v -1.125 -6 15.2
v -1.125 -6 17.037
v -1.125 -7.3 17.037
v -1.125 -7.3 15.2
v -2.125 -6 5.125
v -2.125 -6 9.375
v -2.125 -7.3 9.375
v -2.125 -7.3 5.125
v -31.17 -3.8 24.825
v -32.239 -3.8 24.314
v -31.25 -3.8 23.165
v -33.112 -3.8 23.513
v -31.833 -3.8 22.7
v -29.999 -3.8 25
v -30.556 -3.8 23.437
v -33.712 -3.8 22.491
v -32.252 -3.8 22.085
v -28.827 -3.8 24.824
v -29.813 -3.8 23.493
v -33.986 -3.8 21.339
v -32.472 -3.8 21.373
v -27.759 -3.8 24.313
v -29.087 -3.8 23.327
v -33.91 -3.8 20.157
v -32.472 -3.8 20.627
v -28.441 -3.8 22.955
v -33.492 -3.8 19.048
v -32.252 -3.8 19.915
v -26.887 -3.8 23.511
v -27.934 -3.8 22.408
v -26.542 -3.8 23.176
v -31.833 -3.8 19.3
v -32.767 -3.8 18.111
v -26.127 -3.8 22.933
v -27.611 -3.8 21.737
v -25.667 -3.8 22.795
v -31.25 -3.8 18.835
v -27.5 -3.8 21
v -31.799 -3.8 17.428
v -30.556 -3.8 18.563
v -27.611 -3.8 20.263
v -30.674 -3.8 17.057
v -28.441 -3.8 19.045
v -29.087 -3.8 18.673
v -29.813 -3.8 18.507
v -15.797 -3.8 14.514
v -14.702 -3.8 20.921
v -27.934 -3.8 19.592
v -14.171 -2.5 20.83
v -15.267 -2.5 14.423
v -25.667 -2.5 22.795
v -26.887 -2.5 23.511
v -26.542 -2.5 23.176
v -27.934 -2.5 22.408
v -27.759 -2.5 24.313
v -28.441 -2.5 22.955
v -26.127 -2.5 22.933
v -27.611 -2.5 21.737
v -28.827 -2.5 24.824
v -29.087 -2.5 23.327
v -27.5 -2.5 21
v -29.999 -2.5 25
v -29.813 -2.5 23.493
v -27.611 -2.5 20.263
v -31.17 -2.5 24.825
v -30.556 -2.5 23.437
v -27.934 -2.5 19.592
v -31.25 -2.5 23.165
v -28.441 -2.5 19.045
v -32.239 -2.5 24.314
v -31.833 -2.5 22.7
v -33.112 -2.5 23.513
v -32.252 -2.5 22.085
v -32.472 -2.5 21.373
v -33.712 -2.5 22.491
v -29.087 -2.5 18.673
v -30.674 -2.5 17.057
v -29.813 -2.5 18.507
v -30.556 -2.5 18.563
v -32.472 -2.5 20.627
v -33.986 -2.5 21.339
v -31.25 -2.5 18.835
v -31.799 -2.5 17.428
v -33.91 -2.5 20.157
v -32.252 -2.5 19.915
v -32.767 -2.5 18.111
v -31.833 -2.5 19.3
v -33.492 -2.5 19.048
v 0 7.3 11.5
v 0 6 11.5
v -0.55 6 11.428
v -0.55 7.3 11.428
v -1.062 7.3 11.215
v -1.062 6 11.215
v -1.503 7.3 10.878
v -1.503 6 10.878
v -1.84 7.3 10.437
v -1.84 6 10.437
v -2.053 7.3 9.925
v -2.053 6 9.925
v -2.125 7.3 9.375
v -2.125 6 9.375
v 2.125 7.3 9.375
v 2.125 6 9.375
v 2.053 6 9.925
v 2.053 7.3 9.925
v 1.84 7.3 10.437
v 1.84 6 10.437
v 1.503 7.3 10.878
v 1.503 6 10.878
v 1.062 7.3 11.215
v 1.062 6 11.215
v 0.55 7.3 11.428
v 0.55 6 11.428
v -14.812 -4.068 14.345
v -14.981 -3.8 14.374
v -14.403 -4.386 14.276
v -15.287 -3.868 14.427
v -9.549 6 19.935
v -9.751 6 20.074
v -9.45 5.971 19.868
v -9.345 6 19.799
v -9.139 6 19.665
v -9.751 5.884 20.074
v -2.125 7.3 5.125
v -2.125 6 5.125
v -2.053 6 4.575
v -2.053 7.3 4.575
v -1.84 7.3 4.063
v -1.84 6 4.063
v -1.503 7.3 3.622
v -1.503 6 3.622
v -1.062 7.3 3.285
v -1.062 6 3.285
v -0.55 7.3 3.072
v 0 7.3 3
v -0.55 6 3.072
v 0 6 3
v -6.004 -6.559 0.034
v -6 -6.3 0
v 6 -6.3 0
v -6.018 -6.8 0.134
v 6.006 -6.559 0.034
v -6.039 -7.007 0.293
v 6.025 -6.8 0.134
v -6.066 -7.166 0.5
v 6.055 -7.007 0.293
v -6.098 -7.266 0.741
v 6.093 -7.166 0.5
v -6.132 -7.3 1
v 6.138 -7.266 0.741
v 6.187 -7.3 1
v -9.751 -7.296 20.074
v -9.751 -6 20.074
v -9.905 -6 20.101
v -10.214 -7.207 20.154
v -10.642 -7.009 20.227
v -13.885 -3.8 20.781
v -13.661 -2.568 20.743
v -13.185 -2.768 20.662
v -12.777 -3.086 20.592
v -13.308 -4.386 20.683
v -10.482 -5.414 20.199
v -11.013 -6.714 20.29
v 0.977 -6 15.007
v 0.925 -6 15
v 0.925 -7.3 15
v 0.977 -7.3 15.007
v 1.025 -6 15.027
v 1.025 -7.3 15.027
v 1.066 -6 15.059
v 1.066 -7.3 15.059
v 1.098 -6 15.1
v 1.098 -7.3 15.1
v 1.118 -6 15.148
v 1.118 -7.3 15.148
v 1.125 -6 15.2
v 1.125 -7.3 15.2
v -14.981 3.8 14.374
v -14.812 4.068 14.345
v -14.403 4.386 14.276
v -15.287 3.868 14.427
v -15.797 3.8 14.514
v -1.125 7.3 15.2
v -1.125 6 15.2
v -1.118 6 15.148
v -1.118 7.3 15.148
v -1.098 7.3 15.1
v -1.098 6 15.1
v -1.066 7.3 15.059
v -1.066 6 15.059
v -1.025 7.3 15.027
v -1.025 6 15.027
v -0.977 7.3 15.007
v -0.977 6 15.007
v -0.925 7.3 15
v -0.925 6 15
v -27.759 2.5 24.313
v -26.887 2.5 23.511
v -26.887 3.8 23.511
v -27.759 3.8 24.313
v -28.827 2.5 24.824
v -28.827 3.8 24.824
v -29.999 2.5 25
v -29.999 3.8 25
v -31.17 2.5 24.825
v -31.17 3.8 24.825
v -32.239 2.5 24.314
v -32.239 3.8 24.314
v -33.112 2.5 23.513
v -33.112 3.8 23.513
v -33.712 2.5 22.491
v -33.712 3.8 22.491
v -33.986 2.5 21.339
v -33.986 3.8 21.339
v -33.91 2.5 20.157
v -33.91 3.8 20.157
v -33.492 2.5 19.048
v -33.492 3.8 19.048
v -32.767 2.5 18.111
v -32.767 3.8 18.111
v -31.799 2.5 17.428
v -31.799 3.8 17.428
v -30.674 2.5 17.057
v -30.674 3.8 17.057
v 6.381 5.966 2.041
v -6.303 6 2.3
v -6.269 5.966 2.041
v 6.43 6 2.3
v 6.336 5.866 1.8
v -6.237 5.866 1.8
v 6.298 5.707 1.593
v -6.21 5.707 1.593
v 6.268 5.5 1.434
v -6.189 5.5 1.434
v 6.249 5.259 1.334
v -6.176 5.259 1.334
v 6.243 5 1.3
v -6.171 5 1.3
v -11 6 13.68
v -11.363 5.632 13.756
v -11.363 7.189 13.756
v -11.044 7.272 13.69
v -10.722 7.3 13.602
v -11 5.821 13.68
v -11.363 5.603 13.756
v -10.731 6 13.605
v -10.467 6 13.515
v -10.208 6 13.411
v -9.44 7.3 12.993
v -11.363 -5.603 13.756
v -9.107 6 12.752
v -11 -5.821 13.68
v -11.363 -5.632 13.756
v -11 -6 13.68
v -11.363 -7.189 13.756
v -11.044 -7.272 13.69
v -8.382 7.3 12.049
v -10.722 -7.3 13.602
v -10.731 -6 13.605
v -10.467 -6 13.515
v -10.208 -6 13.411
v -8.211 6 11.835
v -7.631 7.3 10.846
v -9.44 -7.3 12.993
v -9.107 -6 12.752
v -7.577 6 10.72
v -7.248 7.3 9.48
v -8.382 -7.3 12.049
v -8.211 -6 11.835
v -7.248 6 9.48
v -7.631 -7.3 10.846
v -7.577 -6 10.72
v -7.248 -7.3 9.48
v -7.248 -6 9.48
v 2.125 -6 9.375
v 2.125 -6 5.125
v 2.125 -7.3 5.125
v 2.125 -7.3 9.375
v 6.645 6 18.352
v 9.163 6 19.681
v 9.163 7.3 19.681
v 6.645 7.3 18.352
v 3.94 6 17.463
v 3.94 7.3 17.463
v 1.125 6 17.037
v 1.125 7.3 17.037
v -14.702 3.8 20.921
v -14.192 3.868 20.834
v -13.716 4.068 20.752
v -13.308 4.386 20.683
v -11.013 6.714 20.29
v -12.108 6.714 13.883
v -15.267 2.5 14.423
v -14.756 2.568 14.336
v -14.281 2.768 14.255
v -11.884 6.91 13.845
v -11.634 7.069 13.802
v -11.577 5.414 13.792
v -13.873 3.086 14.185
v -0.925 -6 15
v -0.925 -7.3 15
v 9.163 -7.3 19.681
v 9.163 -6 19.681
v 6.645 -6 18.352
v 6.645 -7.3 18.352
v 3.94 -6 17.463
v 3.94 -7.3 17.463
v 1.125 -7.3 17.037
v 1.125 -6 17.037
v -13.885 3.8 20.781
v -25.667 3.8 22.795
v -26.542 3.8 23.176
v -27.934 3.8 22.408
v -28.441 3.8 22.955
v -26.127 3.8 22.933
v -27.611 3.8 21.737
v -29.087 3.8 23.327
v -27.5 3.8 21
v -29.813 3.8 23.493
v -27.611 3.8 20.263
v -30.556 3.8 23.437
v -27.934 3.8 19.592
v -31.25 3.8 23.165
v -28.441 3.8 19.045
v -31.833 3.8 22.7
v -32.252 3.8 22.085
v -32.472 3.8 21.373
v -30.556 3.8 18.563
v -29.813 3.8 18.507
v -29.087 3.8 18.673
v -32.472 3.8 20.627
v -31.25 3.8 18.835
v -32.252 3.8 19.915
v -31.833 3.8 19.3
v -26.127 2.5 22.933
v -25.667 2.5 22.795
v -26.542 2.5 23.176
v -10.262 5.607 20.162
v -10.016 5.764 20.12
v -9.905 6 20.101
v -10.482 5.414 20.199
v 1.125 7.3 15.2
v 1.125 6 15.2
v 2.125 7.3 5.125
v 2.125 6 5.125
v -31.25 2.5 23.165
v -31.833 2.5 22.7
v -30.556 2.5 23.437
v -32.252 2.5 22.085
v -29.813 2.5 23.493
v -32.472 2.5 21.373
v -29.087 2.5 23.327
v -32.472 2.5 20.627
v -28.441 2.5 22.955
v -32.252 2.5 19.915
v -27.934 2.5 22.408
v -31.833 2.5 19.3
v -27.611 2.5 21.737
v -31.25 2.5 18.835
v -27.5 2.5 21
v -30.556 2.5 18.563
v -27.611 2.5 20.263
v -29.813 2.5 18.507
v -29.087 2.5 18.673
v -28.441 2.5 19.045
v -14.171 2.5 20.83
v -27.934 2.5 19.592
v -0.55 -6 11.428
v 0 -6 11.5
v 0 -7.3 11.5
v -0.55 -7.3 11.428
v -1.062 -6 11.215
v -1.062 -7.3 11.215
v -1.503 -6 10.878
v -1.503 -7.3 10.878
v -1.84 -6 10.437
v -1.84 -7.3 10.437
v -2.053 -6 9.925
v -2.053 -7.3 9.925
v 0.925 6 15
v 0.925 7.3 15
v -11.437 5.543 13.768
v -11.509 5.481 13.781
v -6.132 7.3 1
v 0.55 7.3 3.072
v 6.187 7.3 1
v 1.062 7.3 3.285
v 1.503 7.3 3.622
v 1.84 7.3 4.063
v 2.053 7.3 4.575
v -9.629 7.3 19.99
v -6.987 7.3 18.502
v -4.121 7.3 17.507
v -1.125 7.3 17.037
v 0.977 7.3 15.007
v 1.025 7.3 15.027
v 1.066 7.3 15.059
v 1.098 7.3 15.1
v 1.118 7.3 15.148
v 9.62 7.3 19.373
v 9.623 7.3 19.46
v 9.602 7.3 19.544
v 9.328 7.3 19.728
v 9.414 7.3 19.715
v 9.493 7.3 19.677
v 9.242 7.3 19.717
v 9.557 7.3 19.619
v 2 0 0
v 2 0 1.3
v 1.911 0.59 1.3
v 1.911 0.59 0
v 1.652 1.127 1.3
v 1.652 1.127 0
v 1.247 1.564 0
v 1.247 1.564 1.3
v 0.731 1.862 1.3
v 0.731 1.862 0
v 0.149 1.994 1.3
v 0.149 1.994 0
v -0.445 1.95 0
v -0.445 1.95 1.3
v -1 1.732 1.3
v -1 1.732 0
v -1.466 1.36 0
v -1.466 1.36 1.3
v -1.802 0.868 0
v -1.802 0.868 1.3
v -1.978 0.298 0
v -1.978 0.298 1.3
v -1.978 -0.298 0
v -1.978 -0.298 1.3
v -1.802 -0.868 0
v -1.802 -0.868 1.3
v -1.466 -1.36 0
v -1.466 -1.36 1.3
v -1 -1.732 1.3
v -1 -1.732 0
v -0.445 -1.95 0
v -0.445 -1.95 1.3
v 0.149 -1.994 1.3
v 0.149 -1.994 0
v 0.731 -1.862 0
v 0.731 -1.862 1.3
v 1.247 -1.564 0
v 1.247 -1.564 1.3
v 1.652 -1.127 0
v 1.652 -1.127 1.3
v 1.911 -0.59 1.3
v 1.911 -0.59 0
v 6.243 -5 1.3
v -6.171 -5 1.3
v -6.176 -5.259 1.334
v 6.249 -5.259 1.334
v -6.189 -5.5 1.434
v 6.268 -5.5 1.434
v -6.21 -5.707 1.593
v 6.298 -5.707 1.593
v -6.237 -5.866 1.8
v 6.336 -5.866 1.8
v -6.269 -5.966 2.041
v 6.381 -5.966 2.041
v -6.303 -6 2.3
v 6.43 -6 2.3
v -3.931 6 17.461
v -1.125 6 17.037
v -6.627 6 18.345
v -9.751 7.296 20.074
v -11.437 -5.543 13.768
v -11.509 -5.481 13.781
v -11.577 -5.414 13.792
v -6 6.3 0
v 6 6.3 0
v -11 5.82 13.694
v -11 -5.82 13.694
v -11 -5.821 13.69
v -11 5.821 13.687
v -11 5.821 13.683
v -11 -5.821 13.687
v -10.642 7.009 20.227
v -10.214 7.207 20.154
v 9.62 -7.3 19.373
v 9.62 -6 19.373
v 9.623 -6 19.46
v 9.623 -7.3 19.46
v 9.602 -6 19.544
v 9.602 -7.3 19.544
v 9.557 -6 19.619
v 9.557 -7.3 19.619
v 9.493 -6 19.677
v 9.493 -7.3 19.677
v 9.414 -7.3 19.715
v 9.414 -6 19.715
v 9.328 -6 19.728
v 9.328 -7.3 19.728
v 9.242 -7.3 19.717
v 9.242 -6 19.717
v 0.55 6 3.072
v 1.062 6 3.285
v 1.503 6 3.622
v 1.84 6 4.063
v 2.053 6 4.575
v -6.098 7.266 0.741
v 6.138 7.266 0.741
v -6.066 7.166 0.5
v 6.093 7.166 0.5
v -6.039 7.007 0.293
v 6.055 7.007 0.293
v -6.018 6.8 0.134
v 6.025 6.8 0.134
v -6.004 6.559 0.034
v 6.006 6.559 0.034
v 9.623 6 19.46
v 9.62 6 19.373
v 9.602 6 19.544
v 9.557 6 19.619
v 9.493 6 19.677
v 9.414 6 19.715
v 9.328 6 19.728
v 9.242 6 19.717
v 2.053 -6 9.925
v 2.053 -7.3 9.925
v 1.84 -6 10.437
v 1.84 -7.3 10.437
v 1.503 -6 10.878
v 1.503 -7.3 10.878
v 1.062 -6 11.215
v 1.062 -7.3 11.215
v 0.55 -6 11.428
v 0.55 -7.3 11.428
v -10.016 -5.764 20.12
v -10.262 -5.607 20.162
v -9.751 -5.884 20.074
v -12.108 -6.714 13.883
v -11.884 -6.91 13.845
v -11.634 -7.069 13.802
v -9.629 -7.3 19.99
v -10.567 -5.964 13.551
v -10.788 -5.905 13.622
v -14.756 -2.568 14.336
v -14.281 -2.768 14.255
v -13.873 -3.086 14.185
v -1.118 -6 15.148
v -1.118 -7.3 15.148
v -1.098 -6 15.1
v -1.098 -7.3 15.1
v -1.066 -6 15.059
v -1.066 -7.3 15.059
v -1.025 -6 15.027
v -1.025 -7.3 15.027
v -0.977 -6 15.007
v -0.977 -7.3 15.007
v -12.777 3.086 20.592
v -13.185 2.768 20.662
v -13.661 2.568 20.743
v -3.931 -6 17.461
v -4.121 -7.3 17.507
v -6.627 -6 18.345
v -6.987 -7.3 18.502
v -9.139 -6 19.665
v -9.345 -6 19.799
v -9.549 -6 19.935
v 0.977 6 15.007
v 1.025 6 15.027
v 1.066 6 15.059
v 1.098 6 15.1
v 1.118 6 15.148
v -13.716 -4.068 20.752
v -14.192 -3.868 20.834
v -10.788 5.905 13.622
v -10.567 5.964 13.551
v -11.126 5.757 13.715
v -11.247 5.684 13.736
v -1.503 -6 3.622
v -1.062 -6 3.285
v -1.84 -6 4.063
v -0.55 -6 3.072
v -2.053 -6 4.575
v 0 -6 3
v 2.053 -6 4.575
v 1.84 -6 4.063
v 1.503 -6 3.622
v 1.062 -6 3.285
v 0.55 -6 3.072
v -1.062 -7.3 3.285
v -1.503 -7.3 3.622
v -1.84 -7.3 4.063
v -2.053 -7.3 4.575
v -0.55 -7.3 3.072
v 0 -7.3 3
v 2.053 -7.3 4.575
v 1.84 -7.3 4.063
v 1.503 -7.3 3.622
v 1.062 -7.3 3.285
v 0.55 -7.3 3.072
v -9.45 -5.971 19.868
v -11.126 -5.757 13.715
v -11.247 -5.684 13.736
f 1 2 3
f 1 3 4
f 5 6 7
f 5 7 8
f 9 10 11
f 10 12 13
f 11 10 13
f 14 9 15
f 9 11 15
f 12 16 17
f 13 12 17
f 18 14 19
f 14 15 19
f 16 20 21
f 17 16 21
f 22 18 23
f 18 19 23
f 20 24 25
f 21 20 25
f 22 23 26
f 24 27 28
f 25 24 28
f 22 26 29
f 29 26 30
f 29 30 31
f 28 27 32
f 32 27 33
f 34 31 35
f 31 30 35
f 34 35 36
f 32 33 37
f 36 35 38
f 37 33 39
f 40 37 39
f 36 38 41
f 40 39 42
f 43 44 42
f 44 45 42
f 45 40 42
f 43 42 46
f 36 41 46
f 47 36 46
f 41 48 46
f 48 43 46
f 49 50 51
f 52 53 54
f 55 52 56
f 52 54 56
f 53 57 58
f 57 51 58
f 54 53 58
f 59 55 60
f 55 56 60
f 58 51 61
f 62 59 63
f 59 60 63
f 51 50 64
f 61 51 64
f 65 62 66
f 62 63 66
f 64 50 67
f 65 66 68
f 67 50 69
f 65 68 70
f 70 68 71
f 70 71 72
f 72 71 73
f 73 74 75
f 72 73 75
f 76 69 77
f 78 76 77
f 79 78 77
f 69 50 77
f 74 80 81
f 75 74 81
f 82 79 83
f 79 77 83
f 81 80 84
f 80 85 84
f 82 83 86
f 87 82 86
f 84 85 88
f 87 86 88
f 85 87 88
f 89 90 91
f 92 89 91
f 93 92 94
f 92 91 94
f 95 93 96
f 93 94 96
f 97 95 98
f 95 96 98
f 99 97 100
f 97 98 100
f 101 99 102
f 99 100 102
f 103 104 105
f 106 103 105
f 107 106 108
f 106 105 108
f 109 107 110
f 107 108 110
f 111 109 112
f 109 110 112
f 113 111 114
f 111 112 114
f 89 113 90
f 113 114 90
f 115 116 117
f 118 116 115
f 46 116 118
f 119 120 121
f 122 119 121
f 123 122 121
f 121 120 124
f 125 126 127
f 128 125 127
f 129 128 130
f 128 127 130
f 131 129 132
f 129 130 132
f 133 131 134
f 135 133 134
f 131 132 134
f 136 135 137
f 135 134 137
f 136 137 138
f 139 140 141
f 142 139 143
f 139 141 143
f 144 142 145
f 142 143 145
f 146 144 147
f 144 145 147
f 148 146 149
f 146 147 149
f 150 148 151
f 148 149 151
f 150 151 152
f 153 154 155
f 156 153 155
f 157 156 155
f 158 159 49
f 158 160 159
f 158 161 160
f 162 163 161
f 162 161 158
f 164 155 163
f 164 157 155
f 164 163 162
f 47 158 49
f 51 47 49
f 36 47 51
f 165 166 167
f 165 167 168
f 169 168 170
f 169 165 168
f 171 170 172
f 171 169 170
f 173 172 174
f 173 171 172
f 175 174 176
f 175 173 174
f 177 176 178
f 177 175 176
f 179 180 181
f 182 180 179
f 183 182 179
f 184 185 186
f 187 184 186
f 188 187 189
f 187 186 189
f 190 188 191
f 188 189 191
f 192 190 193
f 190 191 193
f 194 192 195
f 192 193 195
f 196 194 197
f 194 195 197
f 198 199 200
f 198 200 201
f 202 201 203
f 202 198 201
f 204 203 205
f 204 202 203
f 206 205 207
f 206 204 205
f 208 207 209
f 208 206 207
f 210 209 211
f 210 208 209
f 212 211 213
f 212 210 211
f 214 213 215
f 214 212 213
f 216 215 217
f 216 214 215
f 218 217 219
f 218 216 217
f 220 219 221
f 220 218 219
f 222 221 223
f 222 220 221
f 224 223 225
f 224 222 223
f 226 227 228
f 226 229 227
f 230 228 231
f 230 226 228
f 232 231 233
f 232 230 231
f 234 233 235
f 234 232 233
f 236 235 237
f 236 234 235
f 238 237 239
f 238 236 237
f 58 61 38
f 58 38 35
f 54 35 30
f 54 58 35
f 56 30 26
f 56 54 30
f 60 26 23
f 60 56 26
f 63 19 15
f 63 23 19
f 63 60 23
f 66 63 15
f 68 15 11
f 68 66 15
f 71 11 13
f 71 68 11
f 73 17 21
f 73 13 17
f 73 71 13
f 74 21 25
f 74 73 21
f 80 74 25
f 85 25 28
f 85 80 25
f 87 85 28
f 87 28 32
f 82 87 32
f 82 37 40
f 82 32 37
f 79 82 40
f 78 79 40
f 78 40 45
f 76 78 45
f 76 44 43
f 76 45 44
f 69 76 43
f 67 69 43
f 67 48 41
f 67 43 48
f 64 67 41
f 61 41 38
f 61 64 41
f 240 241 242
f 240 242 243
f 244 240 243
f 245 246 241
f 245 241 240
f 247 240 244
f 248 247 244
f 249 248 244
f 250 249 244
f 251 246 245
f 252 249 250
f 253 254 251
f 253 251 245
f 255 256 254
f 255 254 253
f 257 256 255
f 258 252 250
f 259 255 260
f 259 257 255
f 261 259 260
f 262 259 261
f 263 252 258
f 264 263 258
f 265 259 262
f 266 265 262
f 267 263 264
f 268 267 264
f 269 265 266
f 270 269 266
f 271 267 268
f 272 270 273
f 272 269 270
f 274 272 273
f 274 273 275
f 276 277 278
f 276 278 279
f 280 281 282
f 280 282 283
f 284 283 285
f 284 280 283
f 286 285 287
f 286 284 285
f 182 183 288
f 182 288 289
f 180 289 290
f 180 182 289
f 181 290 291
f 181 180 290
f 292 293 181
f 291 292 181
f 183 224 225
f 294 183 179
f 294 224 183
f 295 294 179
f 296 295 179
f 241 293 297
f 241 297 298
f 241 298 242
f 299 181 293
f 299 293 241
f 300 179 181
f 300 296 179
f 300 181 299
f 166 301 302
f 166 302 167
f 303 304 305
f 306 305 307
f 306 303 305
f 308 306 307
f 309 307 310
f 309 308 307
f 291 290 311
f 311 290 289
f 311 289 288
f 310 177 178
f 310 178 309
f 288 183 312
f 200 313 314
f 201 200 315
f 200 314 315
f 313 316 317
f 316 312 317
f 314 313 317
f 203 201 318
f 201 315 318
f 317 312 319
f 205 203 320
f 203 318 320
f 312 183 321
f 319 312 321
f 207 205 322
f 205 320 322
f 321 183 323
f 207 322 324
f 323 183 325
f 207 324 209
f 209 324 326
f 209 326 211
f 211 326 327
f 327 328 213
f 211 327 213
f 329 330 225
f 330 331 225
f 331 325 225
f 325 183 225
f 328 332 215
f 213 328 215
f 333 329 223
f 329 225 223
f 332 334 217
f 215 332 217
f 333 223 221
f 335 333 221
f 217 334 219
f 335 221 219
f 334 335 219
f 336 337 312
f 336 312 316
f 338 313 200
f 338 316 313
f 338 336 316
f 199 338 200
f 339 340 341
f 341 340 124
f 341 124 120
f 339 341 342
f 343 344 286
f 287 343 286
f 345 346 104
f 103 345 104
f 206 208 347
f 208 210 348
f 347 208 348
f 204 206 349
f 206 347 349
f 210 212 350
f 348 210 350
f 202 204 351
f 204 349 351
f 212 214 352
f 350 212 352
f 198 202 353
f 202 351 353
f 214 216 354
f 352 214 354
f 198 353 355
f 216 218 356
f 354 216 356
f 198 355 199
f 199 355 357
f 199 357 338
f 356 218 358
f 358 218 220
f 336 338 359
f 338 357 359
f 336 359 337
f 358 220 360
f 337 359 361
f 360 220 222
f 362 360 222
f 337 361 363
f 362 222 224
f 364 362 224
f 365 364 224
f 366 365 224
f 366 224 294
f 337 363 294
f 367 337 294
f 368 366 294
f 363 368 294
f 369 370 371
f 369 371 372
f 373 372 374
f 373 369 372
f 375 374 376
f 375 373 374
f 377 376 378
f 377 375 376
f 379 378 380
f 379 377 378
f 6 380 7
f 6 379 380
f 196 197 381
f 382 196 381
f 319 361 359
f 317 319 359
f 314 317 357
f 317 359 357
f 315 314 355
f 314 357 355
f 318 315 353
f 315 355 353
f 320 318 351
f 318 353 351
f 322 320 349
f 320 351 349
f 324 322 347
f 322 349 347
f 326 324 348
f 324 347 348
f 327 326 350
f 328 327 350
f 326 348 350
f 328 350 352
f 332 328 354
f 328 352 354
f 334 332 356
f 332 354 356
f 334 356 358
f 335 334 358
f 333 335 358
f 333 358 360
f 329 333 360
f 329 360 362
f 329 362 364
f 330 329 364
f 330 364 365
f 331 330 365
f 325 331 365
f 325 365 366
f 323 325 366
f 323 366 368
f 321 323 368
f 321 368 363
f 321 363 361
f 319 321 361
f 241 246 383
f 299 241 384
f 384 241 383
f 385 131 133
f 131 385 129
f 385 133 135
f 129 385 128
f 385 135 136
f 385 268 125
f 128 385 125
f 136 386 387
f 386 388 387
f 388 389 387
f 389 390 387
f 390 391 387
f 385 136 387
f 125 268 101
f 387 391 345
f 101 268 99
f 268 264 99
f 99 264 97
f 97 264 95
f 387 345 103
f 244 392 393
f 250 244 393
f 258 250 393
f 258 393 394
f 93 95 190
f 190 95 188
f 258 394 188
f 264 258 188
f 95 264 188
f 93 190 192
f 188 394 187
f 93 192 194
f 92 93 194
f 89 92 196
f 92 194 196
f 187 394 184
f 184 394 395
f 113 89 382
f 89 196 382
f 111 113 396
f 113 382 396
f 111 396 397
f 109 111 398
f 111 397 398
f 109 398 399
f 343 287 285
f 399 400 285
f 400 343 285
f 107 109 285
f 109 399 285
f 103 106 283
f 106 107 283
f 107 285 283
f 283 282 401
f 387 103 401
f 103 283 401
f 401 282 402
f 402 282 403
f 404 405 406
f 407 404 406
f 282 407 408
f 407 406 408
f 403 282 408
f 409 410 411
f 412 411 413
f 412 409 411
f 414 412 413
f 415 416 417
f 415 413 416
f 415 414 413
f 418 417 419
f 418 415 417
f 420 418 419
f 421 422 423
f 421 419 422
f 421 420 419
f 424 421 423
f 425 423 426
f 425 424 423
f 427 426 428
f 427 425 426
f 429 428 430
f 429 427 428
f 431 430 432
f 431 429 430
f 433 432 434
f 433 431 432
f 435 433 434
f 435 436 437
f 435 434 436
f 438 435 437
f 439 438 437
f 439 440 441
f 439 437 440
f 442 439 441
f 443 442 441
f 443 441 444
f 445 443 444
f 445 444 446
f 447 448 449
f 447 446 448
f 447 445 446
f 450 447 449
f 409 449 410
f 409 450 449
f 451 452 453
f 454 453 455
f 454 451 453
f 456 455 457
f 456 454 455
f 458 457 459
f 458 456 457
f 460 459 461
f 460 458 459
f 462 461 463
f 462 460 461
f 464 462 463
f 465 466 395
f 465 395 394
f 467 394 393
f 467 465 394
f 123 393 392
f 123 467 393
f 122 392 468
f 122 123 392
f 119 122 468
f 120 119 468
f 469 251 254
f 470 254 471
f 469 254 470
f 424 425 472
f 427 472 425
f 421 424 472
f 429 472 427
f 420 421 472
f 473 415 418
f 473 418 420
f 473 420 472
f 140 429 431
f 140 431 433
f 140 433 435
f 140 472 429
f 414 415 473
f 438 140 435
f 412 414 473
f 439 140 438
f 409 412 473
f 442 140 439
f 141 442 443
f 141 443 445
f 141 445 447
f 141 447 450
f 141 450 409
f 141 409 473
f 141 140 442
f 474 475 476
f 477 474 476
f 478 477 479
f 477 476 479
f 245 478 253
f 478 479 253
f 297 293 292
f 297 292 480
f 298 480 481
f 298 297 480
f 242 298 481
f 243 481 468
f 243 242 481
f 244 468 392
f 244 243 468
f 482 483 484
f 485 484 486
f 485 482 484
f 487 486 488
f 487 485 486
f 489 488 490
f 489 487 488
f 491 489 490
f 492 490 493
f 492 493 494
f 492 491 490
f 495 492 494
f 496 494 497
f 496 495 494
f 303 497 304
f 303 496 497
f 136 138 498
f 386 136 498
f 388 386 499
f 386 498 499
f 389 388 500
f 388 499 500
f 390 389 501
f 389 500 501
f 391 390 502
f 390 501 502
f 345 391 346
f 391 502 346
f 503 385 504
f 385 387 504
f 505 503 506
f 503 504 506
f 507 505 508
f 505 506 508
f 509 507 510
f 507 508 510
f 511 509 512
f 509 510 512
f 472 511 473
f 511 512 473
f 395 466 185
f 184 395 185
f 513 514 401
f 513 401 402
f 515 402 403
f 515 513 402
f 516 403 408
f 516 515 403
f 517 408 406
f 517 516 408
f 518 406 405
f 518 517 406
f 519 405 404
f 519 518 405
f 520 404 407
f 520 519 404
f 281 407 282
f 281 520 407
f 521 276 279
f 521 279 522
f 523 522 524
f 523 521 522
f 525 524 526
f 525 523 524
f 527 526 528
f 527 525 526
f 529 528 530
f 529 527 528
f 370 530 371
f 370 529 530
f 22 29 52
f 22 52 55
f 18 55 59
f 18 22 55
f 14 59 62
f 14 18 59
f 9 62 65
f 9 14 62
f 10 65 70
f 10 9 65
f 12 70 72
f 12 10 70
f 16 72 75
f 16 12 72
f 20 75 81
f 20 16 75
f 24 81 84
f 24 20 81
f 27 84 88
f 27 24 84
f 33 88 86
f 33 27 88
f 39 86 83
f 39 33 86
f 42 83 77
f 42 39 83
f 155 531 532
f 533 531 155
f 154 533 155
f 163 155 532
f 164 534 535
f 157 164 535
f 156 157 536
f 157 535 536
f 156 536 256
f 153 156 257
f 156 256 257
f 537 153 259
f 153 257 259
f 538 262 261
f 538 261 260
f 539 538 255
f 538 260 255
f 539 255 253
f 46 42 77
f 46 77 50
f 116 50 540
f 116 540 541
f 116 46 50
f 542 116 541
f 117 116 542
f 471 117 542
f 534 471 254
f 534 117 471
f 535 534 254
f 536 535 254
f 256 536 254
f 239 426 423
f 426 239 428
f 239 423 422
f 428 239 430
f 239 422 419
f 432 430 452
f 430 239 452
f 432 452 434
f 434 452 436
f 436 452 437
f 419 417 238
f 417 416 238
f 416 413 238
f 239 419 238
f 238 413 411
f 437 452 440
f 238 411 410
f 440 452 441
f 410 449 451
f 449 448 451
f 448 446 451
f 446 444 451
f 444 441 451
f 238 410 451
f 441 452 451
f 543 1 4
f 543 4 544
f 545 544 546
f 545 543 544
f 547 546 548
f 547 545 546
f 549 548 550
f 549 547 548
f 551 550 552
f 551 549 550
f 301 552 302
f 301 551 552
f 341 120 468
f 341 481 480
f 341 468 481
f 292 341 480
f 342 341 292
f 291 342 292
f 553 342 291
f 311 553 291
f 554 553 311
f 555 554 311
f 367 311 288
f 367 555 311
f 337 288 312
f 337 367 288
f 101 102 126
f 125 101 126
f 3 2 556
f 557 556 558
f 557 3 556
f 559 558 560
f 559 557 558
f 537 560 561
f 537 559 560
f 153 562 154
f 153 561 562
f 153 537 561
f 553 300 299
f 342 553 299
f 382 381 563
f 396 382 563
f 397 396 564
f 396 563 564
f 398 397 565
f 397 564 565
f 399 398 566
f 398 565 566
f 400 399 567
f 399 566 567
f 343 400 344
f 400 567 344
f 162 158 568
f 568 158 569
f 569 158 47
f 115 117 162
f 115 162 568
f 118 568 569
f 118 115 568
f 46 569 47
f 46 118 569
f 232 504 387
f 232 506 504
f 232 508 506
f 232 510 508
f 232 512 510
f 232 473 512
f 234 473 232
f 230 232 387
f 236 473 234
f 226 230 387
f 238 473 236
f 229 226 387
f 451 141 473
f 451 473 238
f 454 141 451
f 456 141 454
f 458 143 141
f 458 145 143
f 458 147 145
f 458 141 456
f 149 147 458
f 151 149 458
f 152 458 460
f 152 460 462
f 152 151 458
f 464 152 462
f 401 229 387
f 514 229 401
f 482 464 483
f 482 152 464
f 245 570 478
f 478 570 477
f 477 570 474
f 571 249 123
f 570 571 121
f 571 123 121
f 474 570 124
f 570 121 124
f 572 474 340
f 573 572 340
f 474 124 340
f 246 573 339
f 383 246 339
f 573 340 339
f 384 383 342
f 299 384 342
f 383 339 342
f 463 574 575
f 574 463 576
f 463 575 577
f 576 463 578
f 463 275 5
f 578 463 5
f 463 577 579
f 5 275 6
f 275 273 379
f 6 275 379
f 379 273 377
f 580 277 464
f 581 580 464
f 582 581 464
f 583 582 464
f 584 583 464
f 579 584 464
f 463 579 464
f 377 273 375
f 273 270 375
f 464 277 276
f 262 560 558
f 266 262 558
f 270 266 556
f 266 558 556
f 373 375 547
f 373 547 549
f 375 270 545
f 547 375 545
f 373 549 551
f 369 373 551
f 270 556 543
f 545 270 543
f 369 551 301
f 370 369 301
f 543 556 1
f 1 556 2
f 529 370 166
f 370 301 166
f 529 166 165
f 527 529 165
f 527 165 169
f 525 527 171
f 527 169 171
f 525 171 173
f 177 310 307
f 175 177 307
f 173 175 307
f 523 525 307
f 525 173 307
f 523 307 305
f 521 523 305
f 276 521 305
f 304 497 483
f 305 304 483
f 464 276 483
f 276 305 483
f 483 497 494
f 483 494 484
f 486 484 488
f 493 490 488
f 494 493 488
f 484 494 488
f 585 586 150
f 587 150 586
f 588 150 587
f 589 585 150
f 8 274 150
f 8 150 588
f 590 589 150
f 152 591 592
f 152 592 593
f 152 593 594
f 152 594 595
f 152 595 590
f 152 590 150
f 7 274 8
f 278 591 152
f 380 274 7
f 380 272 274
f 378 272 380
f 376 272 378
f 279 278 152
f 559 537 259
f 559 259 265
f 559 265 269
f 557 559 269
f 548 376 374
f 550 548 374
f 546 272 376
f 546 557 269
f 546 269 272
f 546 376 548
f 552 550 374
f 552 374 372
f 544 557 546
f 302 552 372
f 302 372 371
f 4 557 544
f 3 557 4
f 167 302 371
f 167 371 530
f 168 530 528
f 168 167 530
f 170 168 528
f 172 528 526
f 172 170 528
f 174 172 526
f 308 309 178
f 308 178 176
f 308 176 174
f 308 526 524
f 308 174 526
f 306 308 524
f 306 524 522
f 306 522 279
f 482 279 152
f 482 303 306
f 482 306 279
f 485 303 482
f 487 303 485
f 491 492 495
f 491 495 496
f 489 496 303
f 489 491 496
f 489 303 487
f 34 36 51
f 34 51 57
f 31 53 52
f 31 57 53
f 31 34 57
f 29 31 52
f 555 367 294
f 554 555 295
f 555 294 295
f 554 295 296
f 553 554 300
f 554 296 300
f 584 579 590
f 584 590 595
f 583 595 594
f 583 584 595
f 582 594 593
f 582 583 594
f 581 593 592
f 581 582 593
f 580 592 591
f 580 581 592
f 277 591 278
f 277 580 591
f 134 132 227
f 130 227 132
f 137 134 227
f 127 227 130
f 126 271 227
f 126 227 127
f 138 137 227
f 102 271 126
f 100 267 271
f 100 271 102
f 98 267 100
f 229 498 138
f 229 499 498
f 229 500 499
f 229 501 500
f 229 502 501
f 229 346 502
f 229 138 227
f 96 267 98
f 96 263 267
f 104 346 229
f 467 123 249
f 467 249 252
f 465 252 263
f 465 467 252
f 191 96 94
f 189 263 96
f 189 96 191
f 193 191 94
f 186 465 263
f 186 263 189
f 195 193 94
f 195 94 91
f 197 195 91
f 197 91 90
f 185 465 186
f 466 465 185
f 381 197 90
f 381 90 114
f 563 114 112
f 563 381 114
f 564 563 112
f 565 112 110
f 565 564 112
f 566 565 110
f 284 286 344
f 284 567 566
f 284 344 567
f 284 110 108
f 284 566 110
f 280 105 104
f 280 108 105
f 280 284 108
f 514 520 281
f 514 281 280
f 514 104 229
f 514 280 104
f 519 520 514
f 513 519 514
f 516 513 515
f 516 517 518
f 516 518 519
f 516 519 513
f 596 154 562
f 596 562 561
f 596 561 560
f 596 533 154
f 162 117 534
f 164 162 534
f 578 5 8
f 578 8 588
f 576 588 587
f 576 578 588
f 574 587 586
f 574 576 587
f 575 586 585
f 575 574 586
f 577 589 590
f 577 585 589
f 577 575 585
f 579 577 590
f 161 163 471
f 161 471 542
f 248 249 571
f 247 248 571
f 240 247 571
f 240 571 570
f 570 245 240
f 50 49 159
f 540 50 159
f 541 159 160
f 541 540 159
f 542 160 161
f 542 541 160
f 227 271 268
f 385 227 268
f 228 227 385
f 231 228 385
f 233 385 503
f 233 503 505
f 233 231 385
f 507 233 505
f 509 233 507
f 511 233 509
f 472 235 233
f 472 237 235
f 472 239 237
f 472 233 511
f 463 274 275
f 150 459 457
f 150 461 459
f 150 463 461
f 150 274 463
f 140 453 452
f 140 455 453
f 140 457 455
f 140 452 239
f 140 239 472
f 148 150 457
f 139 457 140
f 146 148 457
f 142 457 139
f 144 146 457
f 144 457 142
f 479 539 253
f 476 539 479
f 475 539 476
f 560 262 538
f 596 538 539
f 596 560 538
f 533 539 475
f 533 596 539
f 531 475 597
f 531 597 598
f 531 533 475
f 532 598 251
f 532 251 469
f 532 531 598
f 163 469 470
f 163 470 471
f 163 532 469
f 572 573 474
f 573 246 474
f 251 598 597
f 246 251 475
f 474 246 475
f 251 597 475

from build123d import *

# Parameters (mm, degrees)
F1_DEPTH       = 7.3
F1_DEPTH_BACK  = 7.3
F3_DEPTH       = 6
F3_DEPTH_BACK  = 6
F5_DEPTH       = 10
F5_DEPTH_BACK  = 10
F8_DEPTH       = 25
F9_R           = 2.5
F10_DEPTH      = 10
F10_DEPTH_BACK = 10
F11_T1_DEPTH   = 6.5
F11_T6_DEPTH   = 12.7132034356
F11_S7_R       = 5
F11_T8_DEPTH   = 8
F11_S10_R      = 17
F11_T11_DEPTH  = 8
F11_T15_DEPTH  = 8.5710678119
F11_T20_DEPTH  = 12.7132034356
F11_S21_R      = 5
F11_T22_DEPTH  = 8
F11_S24_R      = 17
F11_T25_DEPTH  = 8
F11_T29_DEPTH  = 8.5710678119
F11_T31_DEPTH  = 10.6421356237
F12_R          = 1
F13_R          = 2
F14_DEPTH      = 5


# Not quite as in the source:
# - a fillet or chamfer that OpenCascade refuses, or shapes differently, is made with other operations: its cross-section is extruded or revolved along the edge and cut away or added


with BuildPart() as f1:
    # F0 (on Front) → F1 (new body, two sides)
    with BuildSketch(Plane.XZ) as f1_sk:
        with BuildLine():
            Line((-7.2480415045, 9.479816391), (-6, 0))
            Line((-6, 0), (6, 0))
            Line((6, 0), (9.6197658273, 19.3731186918))
            ThreePointArc((9.6197658273, 19.3731186918), (9.492555749, 19.6769779623), (9.1631662961, 19.6809084286))
            ThreePointArc((9.1631662961, 19.6809084286), (-0.3536100614, 17.0036780472), (-9.750799418, 20.0744152471))
            Line((-9.750799418, 20.0744152471), (-25.666835692, 22.7954629152))
            ThreePointArc((-25.666835692, 22.7954629152), (-26.3420622378, 23.0419468668), (-26.8865335991, 23.511240126))
            ThreePointArc((-26.8865335991, 23.511240126), (-33.4498266444, 23.0245236782), (-30.6740705867, 17.0572054525))
            Line((-30.6740705867, 17.0572054525), (-11.362677578, 13.7556786143))
            ThreePointArc((-11.362677578, 13.7556786143), (-8.6024605414, 12.2941429125), (-7.2480415045, 9.479816391))
        make_face()
    extrude(amount=F1_DEPTH)
    extrude(f1_sk.sketch, amount=-F1_DEPTH_BACK)

    # F2 (on Front) → F3 (cut, two sides)
    with BuildSketch(Plane.XZ) as f3_sk:
        Polygon((15, 1.3), (15, 78.0352148958), (0, 78.0352148958), (-11, 13.6936742961), (-11, 1.3), align=None)
    extrude(amount=F3_DEPTH, mode=Mode.SUBTRACT)
    extrude(f3_sk.sketch, amount=-F3_DEPTH_BACK, mode=Mode.SUBTRACT)

    # F4 (on Front) → F5 (cut, two sides)
    with BuildSketch(Plane.XZ) as f5_sk:
        with BuildLine():
            Line((0, 18), (-1.125, 18))
            Line((-1.125, 18), (-1.125, 15.2))
            ThreePointArc((-1.125, 15.2), (-1.0664213562, 15.0585786438), (-0.925, 15))
            Line((-0.925, 15), (0, 15))
            Line((0, 15), (0.925, 15))
            ThreePointArc((0.925, 15), (1.0664213562, 15.0585786438), (1.125, 15.2))
            Line((1.125, 15.2), (1.125, 18))
            Line((1.125, 18), (0, 18))
        make_face()
        with BuildLine():
            ThreePointArc((0, 11.5), (-1.50260191, 10.87760191), (-2.125, 9.375))
            Line((-2.125, 9.375), (-2.125, 5.125))
            ThreePointArc((-2.125, 5.125), (-1.50260191, 3.62239809), (0, 3))
            ThreePointArc((0, 3), (1.50260191, 3.62239809), (2.125, 5.125))
            Line((2.125, 5.125), (2.125, 9.375))
            ThreePointArc((2.125, 9.375), (1.50260191, 10.87760191), (0, 11.5))
        make_face()
    extrude(amount=F5_DEPTH, mode=Mode.SUBTRACT)
    extrude(f5_sk.sketch, amount=-F5_DEPTH_BACK, mode=Mode.SUBTRACT)

    # F7 (on offset) → F8 (cut)
    with BuildSketch(Plane(origin=(1.9622434031, 0, 11.4776148716), x_dir=(0.9856986369, 0, -0.1685176467), z_dir=(-0.1685176467, 0, -0.9856986369))):
        Polygon((-41.9907133171, -7.3), (-13.6887884036, -7.3), (-17.1887884036, -3.8), (-41.9907133171, -3.8), align=None)
        Polygon((-41.9907133171, 7.3), (-41.9907133171, 3.8), (-17.1887884036, 3.8), (-13.6887884036, 7.3), align=None)
        Polygon((-16.6503107725, -2.5), (-13.1503107725, -6), (-13.1503107725, 0), (-13.1503107725, 6), (-16.6503107725, 2.5), (-41.9907133171, 2.5), (-41.9907133171, 0), (-41.9907133171, -2.5), align=None)
    extrude(amount=-F8_DEPTH, mode=Mode.SUBTRACT)

    # F9 (on Front) → F10 (cut, two sides)
    with BuildSketch(Plane.XZ) as f10_sk:
        with Locations((-30, 21)):
            Circle(F9_R)
    extrude(amount=F10_DEPTH, mode=Mode.SUBTRACT)
    extrude(f10_sk.sketch, amount=-F10_DEPTH_BACK, mode=Mode.SUBTRACT)

    # F11: fillet of radius 2 on 8 edges, made by hand

    # F11_s2 → F11_t1 (join)
    with BuildSketch(Plane(origin=(1.9622434031, 0, 11.4776148716), x_dir=(0, 1, 0), z_dir=(0.1685176467, 0, 0.9856986369))):
        with BuildLine():
            ThreePointArc((3.8, 18.0172155284), (3.952240935, 17.2518486636), (4.3857864376, 16.603001966))
            Line((4.3857864376, 16.603001966), (3.8, 17.1887884036))
            Line((3.8, 17.1887884036), (3.8, 18.0172155284))
        make_face()
        with BuildLine():
            ThreePointArc((-4.3857864376, 16.603001966), (-3.952240935, 17.2518486636), (-3.8, 18.0172155284))
            Line((-3.8, 18.0172155284), (-3.8, 17.1887884036))
            Line((-3.8, 17.1887884036), (-4.3857864376, 16.603001966))
        make_face()
    extrude(amount=F11_T1_DEPTH)


with BuildPart() as f11_tool4:
    # F11_s5 → F11_t6 (new body)
    with BuildSketch(Plane(origin=(3.0576081065, 0, 17.8846560114), x_dir=(0, 1, 0), z_dir=(-0.1685176467, 0, -0.9856986369))):
        with BuildLine():
            ThreePointArc((-6, -12.3218836478), (-5.847759065, -13.0872505125), (-5.4142135624, -13.7360972102))
            Line((-5.4142135624, -13.7360972102), (-6, -13.1503107725))
            Line((-6, -13.1503107725), (-6, -12.3218836478))
        make_face()
    extrude(amount=F11_T6_DEPTH)

    # F11_s7 → F11_t8 (cut, symmetric)
    with BuildSketch(Plane.XZ.offset(5.7)):
        with Locations((-12.2052658114, 8.8271854299)):
            Circle(F11_S7_R)
    extrude(amount=F11_T8_DEPTH, both=True, mode=Mode.SUBTRACT)

    split(bisect_by=Plane.YZ.offset(-11), keep=Keep.TOP)

    # F11_s10 → F11_t11 (cut, symmetric)
    with BuildSketch(Plane.XZ.offset(5.7)):
        with Locations((0, 34)):
            Circle(F11_S10_R)
    extrude(amount=F11_T11_DEPTH, both=True, mode=Mode.SUBTRACT)


with BuildPart() as f1_1:
    add(f1.part)

    # F11_t3: union F11_tool4
    add(f11_tool4.part)


with BuildPart() as f11_tool13:
    # F11_s14 → F11_t15 (new body)
    with BuildSketch(Plane(origin=(3.4066195803, 0, 19.9261047304), x_dir=(0, 1, 0), z_dir=(-0.1685176467, 0, -0.9856986369))):
        with BuildLine():
            ThreePointArc((-6, -12.3218836478), (-5.847759065, -13.0872505125), (-5.4142135624, -13.7360972102))
            Line((-5.4142135624, -13.7360972102), (-6, -13.1503107725))
            Line((-6, -13.1503107725), (-6, -12.3218836478))
        make_face()
    extrude(amount=F11_T15_DEPTH)

    split(bisect_by=Plane.YZ.offset(-11), keep=Keep.BOTTOM)


with BuildPart() as f1_2:
    add(f1_1.part)

    # F11_t12: union F11_tool13
    add(f11_tool13.part)


with BuildPart() as f11_tool18:
    # F11_s19 → F11_t20 (new body)
    with BuildSketch(Plane(origin=(3.0576081065, 0, 17.8846560114), x_dir=(0, 1, 0), z_dir=(-0.1685176467, 0, -0.9856986369))):
        with BuildLine():
            ThreePointArc((6, -12.3218836478), (5.847759065, -13.0872505125), (5.4142135624, -13.7360972102))
            Line((5.4142135624, -13.7360972102), (6, -13.1503107725))
            Line((6, -13.1503107725), (6, -12.3218836478))
        make_face()
    extrude(amount=F11_T20_DEPTH)

    # F11_s21 → F11_t22 (cut, symmetric)
    with BuildSketch(Plane.XZ.offset(-5.7)):
        with Locations((-12.2052658114, 8.8271854299)):
            Circle(F11_S21_R)
    extrude(amount=F11_T22_DEPTH, both=True, mode=Mode.SUBTRACT)

    split(bisect_by=Plane.YZ.offset(-11), keep=Keep.TOP)

    # F11_s24 → F11_t25 (cut, symmetric)
    with BuildSketch(Plane.XZ.offset(-5.7)):
        with Locations((0, 34)):
            Circle(F11_S24_R)
    extrude(amount=F11_T25_DEPTH, both=True, mode=Mode.SUBTRACT)


with BuildPart() as f1_3:
    add(f1_2.part)

    # F11_t17: union F11_tool18
    add(f11_tool18.part)


with BuildPart() as f11_tool27:
    # F11_s28 → F11_t29 (new body)
    with BuildSketch(Plane(origin=(3.4066195803, 0, 19.9261047304), x_dir=(0, 1, 0), z_dir=(-0.1685176467, 0, -0.9856986369))):
        with BuildLine():
            ThreePointArc((6, -12.3218836478), (5.847759065, -13.0872505125), (5.4142135624, -13.7360972102))
            Line((5.4142135624, -13.7360972102), (6, -13.1503107725))
            Line((6, -13.1503107725), (6, -12.3218836478))
        make_face()
    extrude(amount=F11_T29_DEPTH)

    split(bisect_by=Plane.YZ.offset(-11), keep=Keep.BOTTOM)


with BuildPart() as f1_4:
    add(f1_3.part)

    # F11_t26: union F11_tool27
    add(f11_tool27.part)

    # F11_s32 → F11_t31 (cut)
    with BuildSketch(Plane(origin=(1.6132319293, 0, 9.4361661525), x_dir=(0, 1, 0), z_dir=(0.1685176467, 0, 0.9856986369))):
        with BuildLine():
            ThreePointArc((6.7142135624, 14.2745748413), (7.147759065, 13.6257281436), (7.3, 12.8603612789))
            Line((7.3, 12.8603612789), (7.3, 13.6887884036))
            Line((7.3, 13.6887884036), (6.7142135624, 14.2745748413))
        make_face()
        with BuildLine():
            ThreePointArc((-2.5, 17.4787378973), (-2.652240935, 16.7133710326), (-3.0857864376, 16.0645243349))
            Line((-3.0857864376, 16.0645243349), (-2.5, 16.6503107725))
            Line((-2.5, 16.6503107725), (-2.5, 17.4787378973))
        make_face()
        with BuildLine():
            ThreePointArc((-6.7142135624, 14.2745748413), (-7.147759065, 13.6257281436), (-7.3, 12.8603612789))
            Line((-7.3, 12.8603612789), (-7.3, 13.6887884036))
            Line((-7.3, 13.6887884036), (-6.7142135624, 14.2745748413))
        make_face()
        with BuildLine():
            ThreePointArc((2.5, 17.4787378973), (2.652240935, 16.7133710326), (3.0857864376, 16.0645243349))
            Line((3.0857864376, 16.0645243349), (2.5, 16.6503107725))
            Line((2.5, 16.6503107725), (2.5, 17.4787378973))
        make_face()
    extrude(amount=F11_T31_DEPTH, mode=Mode.SUBTRACT)

    # F12
    f12_edges = [f1_4.edges().sort_by_distance(p)[0] for p in [
        (0.035875, 6, 1.3),
        (0, -7.3, 0),
        (0.035875, -6, 1.3),
        (0, 7.3, 0),
    ]]
    fillet(f12_edges, radius=F12_R)

    # F13 (on Top) → F14 (cut)
    with BuildSketch(Plane.XY):
        Circle(F13_R)
    extrude(amount=F14_DEPTH, mode=Mode.SUBTRACT)


solid = f1_4.part
